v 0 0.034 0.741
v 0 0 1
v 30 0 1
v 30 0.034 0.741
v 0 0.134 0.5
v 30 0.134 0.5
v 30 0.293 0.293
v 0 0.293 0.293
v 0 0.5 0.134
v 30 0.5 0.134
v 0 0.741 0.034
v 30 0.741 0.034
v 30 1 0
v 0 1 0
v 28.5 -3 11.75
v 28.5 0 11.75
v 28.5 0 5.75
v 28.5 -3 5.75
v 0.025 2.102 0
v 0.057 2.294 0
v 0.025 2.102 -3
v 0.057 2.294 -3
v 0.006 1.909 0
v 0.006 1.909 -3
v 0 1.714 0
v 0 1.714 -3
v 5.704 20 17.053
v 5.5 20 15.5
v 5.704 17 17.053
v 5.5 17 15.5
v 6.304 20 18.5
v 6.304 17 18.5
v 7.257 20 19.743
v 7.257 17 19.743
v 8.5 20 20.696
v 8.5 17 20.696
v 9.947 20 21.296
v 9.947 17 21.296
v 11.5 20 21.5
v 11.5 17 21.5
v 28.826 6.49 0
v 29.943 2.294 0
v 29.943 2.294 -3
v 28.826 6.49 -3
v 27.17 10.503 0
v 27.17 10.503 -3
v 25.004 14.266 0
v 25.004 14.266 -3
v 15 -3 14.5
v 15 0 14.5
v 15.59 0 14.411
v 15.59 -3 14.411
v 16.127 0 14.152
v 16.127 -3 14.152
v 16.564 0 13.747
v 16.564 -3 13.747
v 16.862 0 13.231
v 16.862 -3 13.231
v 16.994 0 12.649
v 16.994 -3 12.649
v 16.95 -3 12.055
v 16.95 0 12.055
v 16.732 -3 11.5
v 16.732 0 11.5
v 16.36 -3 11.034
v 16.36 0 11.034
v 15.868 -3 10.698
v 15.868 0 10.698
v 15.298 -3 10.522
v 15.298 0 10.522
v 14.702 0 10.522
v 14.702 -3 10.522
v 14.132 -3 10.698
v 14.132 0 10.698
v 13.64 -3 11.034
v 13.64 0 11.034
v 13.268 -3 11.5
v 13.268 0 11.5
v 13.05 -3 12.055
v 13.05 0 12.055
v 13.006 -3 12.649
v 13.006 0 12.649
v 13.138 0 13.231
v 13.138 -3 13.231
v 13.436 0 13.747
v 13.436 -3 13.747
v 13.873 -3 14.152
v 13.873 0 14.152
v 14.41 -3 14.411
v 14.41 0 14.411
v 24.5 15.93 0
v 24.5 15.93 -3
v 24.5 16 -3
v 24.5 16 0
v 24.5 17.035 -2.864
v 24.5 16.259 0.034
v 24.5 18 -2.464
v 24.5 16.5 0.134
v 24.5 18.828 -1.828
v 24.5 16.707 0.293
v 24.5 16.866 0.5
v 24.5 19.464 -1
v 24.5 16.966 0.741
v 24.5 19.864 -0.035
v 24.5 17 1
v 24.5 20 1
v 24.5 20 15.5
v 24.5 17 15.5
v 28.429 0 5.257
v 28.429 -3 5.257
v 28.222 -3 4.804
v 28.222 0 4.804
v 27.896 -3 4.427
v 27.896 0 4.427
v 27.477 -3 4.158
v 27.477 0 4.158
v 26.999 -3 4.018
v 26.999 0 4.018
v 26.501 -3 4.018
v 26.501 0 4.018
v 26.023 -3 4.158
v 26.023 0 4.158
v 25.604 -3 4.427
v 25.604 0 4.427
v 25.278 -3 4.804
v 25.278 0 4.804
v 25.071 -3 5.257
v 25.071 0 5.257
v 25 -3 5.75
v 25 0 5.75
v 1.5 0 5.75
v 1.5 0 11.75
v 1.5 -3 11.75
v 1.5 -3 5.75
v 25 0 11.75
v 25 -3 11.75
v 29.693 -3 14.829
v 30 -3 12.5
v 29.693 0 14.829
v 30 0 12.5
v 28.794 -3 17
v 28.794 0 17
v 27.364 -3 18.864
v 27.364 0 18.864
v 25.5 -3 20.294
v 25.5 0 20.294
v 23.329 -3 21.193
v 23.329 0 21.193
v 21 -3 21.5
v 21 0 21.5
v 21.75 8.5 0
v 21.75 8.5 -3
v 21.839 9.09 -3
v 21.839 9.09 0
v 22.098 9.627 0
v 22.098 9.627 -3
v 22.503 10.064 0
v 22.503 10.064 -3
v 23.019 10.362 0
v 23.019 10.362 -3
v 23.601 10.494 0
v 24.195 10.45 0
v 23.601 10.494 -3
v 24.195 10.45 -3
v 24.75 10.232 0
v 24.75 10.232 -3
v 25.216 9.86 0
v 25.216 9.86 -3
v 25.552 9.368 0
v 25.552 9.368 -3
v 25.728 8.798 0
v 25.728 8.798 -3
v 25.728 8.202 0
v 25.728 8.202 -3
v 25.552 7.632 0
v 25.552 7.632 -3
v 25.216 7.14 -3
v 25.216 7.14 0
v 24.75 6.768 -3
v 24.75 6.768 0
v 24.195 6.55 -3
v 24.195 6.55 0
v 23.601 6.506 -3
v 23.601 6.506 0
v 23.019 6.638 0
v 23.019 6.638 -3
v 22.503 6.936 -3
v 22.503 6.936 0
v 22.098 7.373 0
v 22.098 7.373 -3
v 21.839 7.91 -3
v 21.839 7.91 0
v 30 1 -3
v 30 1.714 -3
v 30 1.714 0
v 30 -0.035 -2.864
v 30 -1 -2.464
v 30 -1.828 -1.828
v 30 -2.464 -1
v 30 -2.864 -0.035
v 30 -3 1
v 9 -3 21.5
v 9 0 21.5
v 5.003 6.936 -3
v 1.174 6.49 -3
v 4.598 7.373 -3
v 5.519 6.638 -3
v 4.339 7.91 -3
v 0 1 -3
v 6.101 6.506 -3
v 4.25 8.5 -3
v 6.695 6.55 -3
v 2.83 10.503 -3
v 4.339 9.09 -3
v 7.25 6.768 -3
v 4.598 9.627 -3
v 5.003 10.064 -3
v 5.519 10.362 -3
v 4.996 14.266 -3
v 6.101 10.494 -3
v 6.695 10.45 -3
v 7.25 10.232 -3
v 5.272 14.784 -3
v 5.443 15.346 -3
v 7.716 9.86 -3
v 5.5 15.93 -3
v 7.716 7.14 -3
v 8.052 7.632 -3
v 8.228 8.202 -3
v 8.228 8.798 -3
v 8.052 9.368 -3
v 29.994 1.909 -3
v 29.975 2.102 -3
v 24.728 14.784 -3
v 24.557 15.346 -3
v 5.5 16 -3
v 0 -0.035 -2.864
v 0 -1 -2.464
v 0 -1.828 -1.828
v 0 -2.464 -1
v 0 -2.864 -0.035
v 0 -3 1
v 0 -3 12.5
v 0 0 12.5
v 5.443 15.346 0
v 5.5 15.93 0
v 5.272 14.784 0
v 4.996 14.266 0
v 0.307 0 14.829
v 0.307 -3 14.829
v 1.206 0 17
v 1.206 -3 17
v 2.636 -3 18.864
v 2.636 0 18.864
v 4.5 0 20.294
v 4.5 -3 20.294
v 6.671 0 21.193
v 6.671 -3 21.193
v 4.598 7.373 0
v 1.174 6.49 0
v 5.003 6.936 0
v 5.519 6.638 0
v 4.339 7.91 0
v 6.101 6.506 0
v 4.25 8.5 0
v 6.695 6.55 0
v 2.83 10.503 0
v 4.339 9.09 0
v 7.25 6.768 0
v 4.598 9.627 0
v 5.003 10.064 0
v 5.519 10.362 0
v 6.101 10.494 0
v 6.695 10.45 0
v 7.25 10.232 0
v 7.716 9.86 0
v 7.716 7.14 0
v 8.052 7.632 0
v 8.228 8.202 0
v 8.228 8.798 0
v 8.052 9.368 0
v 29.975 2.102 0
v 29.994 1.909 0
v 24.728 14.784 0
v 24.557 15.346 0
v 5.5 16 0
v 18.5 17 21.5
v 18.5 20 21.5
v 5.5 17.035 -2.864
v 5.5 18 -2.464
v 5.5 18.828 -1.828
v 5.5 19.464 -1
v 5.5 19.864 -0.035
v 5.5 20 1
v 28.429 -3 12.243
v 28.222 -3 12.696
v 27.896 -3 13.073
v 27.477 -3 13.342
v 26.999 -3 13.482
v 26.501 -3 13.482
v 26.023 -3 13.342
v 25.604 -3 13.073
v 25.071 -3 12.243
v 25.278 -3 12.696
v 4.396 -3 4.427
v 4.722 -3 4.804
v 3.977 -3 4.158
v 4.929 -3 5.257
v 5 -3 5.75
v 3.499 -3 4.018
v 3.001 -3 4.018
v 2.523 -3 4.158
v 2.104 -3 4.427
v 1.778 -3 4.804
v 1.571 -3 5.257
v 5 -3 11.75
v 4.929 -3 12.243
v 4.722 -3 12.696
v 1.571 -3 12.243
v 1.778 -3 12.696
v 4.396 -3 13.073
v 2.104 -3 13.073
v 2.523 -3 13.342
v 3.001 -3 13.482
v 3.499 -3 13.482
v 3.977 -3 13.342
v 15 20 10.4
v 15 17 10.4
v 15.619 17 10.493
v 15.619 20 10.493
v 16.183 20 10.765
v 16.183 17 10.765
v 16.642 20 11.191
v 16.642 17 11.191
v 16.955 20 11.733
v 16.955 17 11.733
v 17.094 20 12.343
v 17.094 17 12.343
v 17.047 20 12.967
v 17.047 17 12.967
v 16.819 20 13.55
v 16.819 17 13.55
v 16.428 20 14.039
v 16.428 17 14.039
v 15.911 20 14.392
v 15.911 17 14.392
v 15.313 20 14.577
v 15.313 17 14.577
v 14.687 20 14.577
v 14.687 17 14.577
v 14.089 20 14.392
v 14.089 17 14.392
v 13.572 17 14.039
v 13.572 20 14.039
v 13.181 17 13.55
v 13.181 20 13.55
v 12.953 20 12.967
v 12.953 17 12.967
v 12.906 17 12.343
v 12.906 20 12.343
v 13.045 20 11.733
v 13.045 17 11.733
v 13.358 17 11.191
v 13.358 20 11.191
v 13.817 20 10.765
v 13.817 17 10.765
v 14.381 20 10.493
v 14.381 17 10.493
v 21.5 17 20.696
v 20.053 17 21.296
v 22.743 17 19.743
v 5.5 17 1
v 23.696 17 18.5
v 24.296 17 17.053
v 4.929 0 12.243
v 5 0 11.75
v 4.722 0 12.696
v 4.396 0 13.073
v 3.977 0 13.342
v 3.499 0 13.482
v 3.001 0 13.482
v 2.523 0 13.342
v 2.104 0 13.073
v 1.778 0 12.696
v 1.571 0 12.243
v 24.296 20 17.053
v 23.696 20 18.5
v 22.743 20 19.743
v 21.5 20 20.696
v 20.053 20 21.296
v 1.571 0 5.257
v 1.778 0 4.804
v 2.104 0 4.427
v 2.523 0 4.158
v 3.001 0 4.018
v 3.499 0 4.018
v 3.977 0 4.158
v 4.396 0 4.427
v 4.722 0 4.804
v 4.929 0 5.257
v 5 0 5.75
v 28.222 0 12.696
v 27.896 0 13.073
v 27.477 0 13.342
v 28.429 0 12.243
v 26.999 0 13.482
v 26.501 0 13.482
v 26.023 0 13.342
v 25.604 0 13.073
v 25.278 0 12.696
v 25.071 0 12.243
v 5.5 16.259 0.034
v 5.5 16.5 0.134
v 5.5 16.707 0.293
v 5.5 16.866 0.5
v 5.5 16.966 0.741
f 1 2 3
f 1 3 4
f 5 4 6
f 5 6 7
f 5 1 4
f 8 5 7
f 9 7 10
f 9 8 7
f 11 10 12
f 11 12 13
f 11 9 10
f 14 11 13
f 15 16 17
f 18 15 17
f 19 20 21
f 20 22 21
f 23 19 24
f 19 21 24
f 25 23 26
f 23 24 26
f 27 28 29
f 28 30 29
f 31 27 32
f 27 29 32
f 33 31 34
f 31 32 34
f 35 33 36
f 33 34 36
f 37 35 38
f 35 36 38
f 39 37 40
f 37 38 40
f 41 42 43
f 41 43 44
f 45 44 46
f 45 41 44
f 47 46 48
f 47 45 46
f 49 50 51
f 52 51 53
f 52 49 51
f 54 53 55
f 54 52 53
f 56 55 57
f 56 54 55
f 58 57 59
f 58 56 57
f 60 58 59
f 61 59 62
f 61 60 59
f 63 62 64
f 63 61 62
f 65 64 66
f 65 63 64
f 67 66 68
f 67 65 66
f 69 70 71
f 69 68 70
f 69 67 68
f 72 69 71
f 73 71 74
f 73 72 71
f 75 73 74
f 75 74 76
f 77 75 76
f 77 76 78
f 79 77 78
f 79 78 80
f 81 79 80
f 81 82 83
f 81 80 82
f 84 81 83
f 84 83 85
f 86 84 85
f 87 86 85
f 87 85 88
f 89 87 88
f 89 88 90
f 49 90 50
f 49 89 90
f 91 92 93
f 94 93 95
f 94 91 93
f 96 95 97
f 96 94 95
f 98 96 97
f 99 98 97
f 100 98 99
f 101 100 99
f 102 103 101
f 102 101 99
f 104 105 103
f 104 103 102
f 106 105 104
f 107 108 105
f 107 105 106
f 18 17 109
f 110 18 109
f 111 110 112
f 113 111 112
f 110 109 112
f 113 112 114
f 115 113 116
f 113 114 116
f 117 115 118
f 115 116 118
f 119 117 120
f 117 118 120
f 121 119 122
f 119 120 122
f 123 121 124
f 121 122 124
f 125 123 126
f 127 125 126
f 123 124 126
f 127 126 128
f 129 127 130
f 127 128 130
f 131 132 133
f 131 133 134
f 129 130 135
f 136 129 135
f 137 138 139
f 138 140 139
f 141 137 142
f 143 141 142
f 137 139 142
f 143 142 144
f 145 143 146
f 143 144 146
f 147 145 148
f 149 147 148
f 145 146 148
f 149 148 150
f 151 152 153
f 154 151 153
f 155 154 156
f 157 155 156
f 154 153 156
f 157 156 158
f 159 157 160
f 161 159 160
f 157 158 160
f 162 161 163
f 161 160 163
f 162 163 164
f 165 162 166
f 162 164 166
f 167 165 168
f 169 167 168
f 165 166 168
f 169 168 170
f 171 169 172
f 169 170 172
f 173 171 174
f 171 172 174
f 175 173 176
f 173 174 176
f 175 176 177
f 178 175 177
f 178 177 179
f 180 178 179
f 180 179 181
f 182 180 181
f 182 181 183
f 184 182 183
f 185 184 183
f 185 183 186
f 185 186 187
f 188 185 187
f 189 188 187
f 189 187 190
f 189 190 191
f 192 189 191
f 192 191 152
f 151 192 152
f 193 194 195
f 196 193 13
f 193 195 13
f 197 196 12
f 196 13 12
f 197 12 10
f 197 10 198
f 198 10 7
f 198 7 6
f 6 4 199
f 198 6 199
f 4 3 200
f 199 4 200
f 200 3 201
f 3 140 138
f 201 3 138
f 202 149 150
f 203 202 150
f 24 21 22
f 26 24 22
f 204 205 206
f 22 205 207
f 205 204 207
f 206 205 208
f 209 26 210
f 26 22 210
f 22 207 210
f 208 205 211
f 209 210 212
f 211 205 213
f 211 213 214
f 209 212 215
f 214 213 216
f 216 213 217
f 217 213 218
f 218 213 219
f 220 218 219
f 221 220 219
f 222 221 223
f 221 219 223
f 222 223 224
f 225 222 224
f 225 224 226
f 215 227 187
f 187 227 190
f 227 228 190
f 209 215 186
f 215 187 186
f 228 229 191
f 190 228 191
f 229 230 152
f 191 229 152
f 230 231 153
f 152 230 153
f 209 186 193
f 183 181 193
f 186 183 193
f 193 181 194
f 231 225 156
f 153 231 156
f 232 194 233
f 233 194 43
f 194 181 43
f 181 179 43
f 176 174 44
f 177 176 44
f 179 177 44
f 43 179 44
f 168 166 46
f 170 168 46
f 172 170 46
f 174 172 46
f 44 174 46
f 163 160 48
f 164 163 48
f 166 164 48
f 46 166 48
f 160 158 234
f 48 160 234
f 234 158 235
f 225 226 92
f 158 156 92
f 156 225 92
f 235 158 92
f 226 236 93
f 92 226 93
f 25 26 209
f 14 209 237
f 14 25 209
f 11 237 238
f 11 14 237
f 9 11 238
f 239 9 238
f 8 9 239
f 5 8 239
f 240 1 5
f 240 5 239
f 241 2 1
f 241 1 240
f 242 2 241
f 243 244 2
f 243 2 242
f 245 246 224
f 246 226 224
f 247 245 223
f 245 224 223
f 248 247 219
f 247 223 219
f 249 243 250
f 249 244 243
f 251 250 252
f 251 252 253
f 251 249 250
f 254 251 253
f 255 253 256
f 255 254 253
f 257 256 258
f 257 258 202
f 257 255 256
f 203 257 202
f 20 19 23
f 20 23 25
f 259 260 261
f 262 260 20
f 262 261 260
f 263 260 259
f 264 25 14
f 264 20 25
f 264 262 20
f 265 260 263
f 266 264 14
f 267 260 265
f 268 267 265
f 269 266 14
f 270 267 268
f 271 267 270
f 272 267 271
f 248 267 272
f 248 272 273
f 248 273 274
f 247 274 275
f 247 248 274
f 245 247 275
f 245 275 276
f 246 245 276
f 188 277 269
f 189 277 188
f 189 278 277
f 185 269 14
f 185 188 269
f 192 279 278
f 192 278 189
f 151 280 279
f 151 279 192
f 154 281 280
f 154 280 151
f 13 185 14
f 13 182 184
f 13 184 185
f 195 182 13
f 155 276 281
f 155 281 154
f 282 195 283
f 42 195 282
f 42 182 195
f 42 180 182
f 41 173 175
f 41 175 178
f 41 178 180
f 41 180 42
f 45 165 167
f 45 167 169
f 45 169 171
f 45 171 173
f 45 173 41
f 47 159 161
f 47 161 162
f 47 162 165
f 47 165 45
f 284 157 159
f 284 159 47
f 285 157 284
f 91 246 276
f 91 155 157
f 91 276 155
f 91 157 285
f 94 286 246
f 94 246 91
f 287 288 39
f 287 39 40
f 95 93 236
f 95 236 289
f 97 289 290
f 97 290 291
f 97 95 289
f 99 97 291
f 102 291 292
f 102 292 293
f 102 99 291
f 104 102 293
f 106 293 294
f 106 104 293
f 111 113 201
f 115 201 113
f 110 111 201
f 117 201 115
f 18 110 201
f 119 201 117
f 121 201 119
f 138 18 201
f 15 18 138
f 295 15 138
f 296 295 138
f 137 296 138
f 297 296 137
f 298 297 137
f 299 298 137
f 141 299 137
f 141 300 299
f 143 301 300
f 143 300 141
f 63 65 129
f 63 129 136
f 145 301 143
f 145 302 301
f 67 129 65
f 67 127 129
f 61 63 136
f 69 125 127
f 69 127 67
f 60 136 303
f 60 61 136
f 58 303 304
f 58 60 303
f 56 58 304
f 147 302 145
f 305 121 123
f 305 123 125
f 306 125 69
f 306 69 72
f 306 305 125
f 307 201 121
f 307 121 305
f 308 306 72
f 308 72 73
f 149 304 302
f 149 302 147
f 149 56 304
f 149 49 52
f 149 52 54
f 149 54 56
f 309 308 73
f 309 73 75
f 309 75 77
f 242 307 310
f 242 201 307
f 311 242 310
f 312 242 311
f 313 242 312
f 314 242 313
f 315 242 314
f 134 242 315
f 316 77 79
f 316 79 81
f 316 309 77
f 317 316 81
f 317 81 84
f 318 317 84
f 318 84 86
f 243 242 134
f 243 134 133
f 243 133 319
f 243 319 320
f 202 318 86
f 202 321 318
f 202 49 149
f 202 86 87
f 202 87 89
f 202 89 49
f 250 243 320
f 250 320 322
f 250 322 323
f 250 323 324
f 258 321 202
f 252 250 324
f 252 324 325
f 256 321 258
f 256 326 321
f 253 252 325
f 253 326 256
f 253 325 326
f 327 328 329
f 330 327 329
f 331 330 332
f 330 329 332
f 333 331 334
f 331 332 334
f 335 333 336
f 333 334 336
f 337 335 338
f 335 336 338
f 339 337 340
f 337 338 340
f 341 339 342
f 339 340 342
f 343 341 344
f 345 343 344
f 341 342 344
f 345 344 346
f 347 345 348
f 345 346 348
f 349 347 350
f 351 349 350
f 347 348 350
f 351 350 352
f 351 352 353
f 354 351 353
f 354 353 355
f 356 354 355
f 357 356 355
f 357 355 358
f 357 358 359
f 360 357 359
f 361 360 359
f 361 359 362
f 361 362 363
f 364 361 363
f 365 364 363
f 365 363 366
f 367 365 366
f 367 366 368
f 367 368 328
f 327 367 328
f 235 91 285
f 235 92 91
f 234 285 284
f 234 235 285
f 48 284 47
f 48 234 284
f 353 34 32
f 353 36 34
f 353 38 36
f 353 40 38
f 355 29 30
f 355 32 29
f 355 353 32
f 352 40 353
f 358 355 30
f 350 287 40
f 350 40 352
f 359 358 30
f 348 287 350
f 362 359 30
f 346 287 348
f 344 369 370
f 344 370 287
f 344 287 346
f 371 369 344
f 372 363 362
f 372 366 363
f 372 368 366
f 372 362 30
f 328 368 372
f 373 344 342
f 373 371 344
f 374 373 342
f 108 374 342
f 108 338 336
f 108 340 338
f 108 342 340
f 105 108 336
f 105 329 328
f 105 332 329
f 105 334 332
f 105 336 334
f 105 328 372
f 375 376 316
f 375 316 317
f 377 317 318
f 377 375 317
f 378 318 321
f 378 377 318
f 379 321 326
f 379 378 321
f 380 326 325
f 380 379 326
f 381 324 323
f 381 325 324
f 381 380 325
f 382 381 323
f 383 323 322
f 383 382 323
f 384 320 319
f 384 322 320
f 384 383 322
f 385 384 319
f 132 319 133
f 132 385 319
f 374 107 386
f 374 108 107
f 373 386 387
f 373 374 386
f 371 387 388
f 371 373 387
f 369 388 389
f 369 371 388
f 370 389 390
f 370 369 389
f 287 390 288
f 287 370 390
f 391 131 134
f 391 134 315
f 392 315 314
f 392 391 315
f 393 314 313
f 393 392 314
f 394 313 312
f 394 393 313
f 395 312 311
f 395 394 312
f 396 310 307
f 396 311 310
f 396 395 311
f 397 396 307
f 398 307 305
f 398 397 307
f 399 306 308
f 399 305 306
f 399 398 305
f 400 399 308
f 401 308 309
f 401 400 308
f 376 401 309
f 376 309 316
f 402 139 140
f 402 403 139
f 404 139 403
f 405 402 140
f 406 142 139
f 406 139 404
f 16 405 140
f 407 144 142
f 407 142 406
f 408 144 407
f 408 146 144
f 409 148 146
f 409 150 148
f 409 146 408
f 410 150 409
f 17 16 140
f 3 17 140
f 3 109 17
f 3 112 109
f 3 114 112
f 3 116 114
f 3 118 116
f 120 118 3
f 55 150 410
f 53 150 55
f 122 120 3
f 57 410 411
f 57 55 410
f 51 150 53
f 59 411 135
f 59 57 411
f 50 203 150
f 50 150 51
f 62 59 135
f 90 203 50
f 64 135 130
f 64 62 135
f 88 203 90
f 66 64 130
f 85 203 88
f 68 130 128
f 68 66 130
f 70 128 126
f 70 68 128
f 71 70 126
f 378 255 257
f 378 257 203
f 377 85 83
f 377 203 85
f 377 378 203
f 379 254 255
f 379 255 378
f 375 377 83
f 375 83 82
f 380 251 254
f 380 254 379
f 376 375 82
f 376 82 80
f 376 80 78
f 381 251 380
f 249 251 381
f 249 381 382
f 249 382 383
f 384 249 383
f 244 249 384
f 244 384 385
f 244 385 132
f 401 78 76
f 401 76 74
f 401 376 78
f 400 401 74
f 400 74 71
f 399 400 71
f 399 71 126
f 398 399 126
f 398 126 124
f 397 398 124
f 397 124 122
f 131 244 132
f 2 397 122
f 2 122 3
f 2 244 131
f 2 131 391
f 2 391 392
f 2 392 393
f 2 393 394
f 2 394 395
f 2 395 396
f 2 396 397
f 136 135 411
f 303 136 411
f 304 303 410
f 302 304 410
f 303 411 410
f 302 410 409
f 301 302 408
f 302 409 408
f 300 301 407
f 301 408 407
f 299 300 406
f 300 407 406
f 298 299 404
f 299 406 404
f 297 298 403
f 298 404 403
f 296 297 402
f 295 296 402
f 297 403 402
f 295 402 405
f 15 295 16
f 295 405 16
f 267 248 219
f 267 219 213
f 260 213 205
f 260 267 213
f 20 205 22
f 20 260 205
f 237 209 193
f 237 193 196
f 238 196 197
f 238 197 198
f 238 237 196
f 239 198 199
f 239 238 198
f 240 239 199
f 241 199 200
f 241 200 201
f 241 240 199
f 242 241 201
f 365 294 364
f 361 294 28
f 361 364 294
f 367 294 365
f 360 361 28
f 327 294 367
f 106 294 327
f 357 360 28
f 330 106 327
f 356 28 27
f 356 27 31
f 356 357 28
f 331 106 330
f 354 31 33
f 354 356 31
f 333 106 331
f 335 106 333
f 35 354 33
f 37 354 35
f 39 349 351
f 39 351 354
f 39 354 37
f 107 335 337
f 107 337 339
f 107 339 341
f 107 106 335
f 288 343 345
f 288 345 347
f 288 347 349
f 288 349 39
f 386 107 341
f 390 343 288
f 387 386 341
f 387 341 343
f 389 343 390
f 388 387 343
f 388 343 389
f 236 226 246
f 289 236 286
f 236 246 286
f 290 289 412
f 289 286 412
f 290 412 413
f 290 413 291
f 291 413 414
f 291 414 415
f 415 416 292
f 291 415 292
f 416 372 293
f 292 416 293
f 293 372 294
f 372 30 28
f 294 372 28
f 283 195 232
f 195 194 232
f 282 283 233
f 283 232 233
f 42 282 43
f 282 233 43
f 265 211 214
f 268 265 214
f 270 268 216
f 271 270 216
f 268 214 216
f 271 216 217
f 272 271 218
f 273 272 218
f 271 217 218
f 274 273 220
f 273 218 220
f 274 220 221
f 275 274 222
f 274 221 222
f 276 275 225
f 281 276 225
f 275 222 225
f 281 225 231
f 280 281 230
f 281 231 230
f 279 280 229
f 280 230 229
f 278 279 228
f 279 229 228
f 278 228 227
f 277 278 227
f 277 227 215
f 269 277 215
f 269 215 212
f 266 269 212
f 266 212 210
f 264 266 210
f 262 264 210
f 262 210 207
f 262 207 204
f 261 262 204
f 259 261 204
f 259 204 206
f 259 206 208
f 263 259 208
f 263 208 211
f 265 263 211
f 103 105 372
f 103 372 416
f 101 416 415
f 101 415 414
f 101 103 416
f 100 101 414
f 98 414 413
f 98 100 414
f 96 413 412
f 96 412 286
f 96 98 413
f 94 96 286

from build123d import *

# Parameters (mm, degrees)
BRIDA_BASE1_DEPTH                = 3
BRIDA_DE_ARISTA1_STRIP_W         = 14
BRIDA_DE_ARISTA1_STRIP_H         = 3
BRIDA_DE_ARISTA1_STRIP_CUT_DEPTH = 30
BRIDA_DE_ARISTA1_DEPTH           = 30
BRIDA_DE_ARISTA2_DEPTH           = 19
CORTAR_EXTRUIR1_REACH            = 45.489
CROQUIS12_R                      = 2
CORTAR_EXTRUIR2_REACH            = 43.979
CORTAR_EXTRUIR6_REACH            = 45.592
CROQUIS26_R                      = 2
TALADRO_ROSCADO_M51_D            = 4.2
TALADRO_ROSCADO_M51_DEPTH        = 3
REDONDEO2_R                      = 9
REDONDEO3_R                      = 6
REDONDEO4_R                      = 3


# Sheet-metal steps are written as plain solids
with BuildPart() as part:
    # Croquis1 → Brida base1 (new body)
    with BuildSketch(Plane.XY):
        with BuildLine():
            Line((0, 0), (30, 0))
            Line((30, 0), (30, 2))
            ThreePointArc((30, 2), (27.949996593, 8.796152405), (24.5, 15))
            Line((24.5, 15), (24.5, 16))
            Line((24.5, 16), (5.5, 16))
            Line((5.5, 16), (5.5, 15))
            ThreePointArc((5.5, 15), (2.050003407, 8.796152405), (0, 2))
            Line((0, 2), (0, 0))
        make_face()
    extrude(amount=-BRIDA_BASE1_DEPTH)

    # Brida de arista1 strip (across the edge) → Brida de arista1 strip cut (cut)
    with BuildSketch(Plane.YZ):
        with Locations((-6, -1.5)):
            Rectangle(BRIDA_DE_ARISTA1_STRIP_W, BRIDA_DE_ARISTA1_STRIP_H)
    extrude(amount=BRIDA_DE_ARISTA1_STRIP_CUT_DEPTH, mode=Mode.SUBTRACT)

    # Brida de arista1 section (across the edge) → Brida de arista1 (add)
    with BuildSketch(Plane.YZ):
        with BuildLine():
            Line((-3, 1), (-3, 21.5))
            Line((-3, 21.5), (0, 21.5))
            Line((0, 21.5), (0, 1))
            ThreePointArc((0, 1), (0.292893219, 0.292893219), (1, 0))
            Line((1, 0), (1, -3))
            ThreePointArc((1, -3), (-1.828427125, -1.828427125), (-3, 1))
        make_face()
    extrude(amount=BRIDA_DE_ARISTA1_DEPTH)

    # Brida de arista2 section (across the edge) → Brida de arista2 (add)
    with BuildSketch(Plane(origin=(24.5, 17, 0), x_dir=(0, -1, 0), z_dir=(-1, 0, 0))):
        with BuildLine():
            Line((-3, 1), (-3, 21.5))
            Line((-3, 21.5), (0, 21.5))
            Line((0, 21.5), (0, 1))
            ThreePointArc((0, 1), (0.292893219, 0.292893219), (1, 0))
            Line((1, 0), (1, -3))
            ThreePointArc((1, -3), (-1.828427125, -1.828427125), (-3, 1))
        make_face()
    extrude(amount=BRIDA_DE_ARISTA2_DEPTH)

    # Croquis12 → Cortar-Extruir1 (cut, up to next)
    with BuildSketch(Plane(origin=(0, -3, 0), x_dir=(1, 0, 0), z_dir=(0, 1, 0)), mode=Mode.PRIVATE) as cortar_extruir1_sk1:
        with Locations(Location((15, -12.5, 0), (0, 0, 270))):
            Circle(CROQUIS12_R)
    cortar_extruir1_tool1 = extrude(cortar_extruir1_sk1.sketch, amount=CORTAR_EXTRUIR1_REACH, mode=Mode.PRIVATE) & part.part
    add(cortar_extruir1_tool1.solids().sort_by_distance((15, -3, 12.5))[0], mode=Mode.SUBTRACT)

    # Croquis13 → Cortar-Extruir2 (cut, up to next)
    with BuildSketch(Plane(origin=(0, 0, 0), x_dir=(1, 0, 0), z_dir=(0, 1, 0)), mode=Mode.PRIVATE) as cortar_extruir2_sk1:
        with BuildLine():
            Line((5, -5.75), (5, -11.75))
            ThreePointArc((5, -11.75), (3.25, -13.5), (1.5, -11.75))
            Line((1.5, -11.75), (1.5, -5.75))
            ThreePointArc((1.5, -5.75), (3.25, -4), (5, -5.75))
        make_face()
    cortar_extruir2_tool1 = extrude(cortar_extruir2_sk1.sketch, amount=-CORTAR_EXTRUIR2_REACH, mode=Mode.PRIVATE) & part.part
    # Croquis13 → Cortar-Extruir2 (cut, up to next)
    with BuildSketch(Plane(origin=(0, 0, 0), x_dir=(1, 0, 0), z_dir=(0, 1, 0)), mode=Mode.PRIVATE) as cortar_extruir2_sk2:
        with BuildLine():
            Line((25, -5.75), (25, -11.75))
            ThreePointArc((25, -11.75), (26.75, -13.5), (28.5, -11.75))
            Line((28.5, -11.75), (28.5, -5.75))
            ThreePointArc((28.5, -5.75), (26.75, -4), (25, -5.75))
        make_face()
    cortar_extruir2_tool2 = extrude(cortar_extruir2_sk2.sketch, amount=-CORTAR_EXTRUIR2_REACH, mode=Mode.PRIVATE) & part.part
    add(cortar_extruir2_tool1.solids().sort_by_distance((3.25, 0, 8.75))[0], mode=Mode.SUBTRACT)
    add(cortar_extruir2_tool2.solids().sort_by_distance((26.75, 0, 8.75))[0], mode=Mode.SUBTRACT)

    # Croquis26 → Cortar-Extruir6 (cut, up to next)
    with BuildSketch(Plane(origin=(0, 0, -3), x_dir=(-1, 0, 0), z_dir=(0, 0, -1)), mode=Mode.PRIVATE) as cortar_extruir6_sk1:
        with Locations((-6.25, 8.5)):
            Circle(CROQUIS26_R)
    cortar_extruir6_tool1 = extrude(cortar_extruir6_sk1.sketch, amount=-CORTAR_EXTRUIR6_REACH, mode=Mode.PRIVATE) & part.part
    # Croquis26 → Cortar-Extruir6 (cut, up to next)
    with BuildSketch(Plane(origin=(0, 0, -3), x_dir=(-1, 0, 0), z_dir=(0, 0, -1)), mode=Mode.PRIVATE) as cortar_extruir6_sk2:
        with Locations((-23.75, 8.5)):
            Circle(CROQUIS26_R)
    cortar_extruir6_tool2 = extrude(cortar_extruir6_sk2.sketch, amount=-CORTAR_EXTRUIR6_REACH, mode=Mode.PRIVATE) & part.part
    add(cortar_extruir6_tool1.solids().sort_by_distance((6.25, 8.5, -3))[0], mode=Mode.SUBTRACT)
    add(cortar_extruir6_tool2.solids().sort_by_distance((23.75, 8.5, -3))[0], mode=Mode.SUBTRACT)

    # Taladro roscado M51
    with Locations(Plane(origin=(15, 20, 12.5), x_dir=(0, 0, 1), z_dir=(0, 1, 0))):
        with Locations((0, 0)):
            Hole(TALADRO_ROSCADO_M51_D / 2, depth=TALADRO_ROSCADO_M51_DEPTH)

    # Redondeo2
    redondeo2_edges = [part.edges().sort_by_distance(p)[0] for p in [
        (0, -1.5, 21.5),
        (30, -1.5, 21.5),
    ]]
    fillet(redondeo2_edges, radius=REDONDEO2_R)

    # Redondeo3
    redondeo3_edges = [part.edges().sort_by_distance(p)[0] for p in [
        (24.5, 18.5, 21.5),
        (5.5, 18.5, 21.5),
    ]]
    fillet(redondeo3_edges, radius=REDONDEO3_R)

    # Redondeo4
    redondeo4_edges = [part.edges().sort_by_distance(p)[0] for p in [
        (0, 2, -1.5),
        (5.5, 15, -1.5),
        (24.5, 15, -1.5),
        (30, 2, -1.5),
    ]]
    fillet(redondeo4_edges, radius=REDONDEO4_R)


solid = part.part
